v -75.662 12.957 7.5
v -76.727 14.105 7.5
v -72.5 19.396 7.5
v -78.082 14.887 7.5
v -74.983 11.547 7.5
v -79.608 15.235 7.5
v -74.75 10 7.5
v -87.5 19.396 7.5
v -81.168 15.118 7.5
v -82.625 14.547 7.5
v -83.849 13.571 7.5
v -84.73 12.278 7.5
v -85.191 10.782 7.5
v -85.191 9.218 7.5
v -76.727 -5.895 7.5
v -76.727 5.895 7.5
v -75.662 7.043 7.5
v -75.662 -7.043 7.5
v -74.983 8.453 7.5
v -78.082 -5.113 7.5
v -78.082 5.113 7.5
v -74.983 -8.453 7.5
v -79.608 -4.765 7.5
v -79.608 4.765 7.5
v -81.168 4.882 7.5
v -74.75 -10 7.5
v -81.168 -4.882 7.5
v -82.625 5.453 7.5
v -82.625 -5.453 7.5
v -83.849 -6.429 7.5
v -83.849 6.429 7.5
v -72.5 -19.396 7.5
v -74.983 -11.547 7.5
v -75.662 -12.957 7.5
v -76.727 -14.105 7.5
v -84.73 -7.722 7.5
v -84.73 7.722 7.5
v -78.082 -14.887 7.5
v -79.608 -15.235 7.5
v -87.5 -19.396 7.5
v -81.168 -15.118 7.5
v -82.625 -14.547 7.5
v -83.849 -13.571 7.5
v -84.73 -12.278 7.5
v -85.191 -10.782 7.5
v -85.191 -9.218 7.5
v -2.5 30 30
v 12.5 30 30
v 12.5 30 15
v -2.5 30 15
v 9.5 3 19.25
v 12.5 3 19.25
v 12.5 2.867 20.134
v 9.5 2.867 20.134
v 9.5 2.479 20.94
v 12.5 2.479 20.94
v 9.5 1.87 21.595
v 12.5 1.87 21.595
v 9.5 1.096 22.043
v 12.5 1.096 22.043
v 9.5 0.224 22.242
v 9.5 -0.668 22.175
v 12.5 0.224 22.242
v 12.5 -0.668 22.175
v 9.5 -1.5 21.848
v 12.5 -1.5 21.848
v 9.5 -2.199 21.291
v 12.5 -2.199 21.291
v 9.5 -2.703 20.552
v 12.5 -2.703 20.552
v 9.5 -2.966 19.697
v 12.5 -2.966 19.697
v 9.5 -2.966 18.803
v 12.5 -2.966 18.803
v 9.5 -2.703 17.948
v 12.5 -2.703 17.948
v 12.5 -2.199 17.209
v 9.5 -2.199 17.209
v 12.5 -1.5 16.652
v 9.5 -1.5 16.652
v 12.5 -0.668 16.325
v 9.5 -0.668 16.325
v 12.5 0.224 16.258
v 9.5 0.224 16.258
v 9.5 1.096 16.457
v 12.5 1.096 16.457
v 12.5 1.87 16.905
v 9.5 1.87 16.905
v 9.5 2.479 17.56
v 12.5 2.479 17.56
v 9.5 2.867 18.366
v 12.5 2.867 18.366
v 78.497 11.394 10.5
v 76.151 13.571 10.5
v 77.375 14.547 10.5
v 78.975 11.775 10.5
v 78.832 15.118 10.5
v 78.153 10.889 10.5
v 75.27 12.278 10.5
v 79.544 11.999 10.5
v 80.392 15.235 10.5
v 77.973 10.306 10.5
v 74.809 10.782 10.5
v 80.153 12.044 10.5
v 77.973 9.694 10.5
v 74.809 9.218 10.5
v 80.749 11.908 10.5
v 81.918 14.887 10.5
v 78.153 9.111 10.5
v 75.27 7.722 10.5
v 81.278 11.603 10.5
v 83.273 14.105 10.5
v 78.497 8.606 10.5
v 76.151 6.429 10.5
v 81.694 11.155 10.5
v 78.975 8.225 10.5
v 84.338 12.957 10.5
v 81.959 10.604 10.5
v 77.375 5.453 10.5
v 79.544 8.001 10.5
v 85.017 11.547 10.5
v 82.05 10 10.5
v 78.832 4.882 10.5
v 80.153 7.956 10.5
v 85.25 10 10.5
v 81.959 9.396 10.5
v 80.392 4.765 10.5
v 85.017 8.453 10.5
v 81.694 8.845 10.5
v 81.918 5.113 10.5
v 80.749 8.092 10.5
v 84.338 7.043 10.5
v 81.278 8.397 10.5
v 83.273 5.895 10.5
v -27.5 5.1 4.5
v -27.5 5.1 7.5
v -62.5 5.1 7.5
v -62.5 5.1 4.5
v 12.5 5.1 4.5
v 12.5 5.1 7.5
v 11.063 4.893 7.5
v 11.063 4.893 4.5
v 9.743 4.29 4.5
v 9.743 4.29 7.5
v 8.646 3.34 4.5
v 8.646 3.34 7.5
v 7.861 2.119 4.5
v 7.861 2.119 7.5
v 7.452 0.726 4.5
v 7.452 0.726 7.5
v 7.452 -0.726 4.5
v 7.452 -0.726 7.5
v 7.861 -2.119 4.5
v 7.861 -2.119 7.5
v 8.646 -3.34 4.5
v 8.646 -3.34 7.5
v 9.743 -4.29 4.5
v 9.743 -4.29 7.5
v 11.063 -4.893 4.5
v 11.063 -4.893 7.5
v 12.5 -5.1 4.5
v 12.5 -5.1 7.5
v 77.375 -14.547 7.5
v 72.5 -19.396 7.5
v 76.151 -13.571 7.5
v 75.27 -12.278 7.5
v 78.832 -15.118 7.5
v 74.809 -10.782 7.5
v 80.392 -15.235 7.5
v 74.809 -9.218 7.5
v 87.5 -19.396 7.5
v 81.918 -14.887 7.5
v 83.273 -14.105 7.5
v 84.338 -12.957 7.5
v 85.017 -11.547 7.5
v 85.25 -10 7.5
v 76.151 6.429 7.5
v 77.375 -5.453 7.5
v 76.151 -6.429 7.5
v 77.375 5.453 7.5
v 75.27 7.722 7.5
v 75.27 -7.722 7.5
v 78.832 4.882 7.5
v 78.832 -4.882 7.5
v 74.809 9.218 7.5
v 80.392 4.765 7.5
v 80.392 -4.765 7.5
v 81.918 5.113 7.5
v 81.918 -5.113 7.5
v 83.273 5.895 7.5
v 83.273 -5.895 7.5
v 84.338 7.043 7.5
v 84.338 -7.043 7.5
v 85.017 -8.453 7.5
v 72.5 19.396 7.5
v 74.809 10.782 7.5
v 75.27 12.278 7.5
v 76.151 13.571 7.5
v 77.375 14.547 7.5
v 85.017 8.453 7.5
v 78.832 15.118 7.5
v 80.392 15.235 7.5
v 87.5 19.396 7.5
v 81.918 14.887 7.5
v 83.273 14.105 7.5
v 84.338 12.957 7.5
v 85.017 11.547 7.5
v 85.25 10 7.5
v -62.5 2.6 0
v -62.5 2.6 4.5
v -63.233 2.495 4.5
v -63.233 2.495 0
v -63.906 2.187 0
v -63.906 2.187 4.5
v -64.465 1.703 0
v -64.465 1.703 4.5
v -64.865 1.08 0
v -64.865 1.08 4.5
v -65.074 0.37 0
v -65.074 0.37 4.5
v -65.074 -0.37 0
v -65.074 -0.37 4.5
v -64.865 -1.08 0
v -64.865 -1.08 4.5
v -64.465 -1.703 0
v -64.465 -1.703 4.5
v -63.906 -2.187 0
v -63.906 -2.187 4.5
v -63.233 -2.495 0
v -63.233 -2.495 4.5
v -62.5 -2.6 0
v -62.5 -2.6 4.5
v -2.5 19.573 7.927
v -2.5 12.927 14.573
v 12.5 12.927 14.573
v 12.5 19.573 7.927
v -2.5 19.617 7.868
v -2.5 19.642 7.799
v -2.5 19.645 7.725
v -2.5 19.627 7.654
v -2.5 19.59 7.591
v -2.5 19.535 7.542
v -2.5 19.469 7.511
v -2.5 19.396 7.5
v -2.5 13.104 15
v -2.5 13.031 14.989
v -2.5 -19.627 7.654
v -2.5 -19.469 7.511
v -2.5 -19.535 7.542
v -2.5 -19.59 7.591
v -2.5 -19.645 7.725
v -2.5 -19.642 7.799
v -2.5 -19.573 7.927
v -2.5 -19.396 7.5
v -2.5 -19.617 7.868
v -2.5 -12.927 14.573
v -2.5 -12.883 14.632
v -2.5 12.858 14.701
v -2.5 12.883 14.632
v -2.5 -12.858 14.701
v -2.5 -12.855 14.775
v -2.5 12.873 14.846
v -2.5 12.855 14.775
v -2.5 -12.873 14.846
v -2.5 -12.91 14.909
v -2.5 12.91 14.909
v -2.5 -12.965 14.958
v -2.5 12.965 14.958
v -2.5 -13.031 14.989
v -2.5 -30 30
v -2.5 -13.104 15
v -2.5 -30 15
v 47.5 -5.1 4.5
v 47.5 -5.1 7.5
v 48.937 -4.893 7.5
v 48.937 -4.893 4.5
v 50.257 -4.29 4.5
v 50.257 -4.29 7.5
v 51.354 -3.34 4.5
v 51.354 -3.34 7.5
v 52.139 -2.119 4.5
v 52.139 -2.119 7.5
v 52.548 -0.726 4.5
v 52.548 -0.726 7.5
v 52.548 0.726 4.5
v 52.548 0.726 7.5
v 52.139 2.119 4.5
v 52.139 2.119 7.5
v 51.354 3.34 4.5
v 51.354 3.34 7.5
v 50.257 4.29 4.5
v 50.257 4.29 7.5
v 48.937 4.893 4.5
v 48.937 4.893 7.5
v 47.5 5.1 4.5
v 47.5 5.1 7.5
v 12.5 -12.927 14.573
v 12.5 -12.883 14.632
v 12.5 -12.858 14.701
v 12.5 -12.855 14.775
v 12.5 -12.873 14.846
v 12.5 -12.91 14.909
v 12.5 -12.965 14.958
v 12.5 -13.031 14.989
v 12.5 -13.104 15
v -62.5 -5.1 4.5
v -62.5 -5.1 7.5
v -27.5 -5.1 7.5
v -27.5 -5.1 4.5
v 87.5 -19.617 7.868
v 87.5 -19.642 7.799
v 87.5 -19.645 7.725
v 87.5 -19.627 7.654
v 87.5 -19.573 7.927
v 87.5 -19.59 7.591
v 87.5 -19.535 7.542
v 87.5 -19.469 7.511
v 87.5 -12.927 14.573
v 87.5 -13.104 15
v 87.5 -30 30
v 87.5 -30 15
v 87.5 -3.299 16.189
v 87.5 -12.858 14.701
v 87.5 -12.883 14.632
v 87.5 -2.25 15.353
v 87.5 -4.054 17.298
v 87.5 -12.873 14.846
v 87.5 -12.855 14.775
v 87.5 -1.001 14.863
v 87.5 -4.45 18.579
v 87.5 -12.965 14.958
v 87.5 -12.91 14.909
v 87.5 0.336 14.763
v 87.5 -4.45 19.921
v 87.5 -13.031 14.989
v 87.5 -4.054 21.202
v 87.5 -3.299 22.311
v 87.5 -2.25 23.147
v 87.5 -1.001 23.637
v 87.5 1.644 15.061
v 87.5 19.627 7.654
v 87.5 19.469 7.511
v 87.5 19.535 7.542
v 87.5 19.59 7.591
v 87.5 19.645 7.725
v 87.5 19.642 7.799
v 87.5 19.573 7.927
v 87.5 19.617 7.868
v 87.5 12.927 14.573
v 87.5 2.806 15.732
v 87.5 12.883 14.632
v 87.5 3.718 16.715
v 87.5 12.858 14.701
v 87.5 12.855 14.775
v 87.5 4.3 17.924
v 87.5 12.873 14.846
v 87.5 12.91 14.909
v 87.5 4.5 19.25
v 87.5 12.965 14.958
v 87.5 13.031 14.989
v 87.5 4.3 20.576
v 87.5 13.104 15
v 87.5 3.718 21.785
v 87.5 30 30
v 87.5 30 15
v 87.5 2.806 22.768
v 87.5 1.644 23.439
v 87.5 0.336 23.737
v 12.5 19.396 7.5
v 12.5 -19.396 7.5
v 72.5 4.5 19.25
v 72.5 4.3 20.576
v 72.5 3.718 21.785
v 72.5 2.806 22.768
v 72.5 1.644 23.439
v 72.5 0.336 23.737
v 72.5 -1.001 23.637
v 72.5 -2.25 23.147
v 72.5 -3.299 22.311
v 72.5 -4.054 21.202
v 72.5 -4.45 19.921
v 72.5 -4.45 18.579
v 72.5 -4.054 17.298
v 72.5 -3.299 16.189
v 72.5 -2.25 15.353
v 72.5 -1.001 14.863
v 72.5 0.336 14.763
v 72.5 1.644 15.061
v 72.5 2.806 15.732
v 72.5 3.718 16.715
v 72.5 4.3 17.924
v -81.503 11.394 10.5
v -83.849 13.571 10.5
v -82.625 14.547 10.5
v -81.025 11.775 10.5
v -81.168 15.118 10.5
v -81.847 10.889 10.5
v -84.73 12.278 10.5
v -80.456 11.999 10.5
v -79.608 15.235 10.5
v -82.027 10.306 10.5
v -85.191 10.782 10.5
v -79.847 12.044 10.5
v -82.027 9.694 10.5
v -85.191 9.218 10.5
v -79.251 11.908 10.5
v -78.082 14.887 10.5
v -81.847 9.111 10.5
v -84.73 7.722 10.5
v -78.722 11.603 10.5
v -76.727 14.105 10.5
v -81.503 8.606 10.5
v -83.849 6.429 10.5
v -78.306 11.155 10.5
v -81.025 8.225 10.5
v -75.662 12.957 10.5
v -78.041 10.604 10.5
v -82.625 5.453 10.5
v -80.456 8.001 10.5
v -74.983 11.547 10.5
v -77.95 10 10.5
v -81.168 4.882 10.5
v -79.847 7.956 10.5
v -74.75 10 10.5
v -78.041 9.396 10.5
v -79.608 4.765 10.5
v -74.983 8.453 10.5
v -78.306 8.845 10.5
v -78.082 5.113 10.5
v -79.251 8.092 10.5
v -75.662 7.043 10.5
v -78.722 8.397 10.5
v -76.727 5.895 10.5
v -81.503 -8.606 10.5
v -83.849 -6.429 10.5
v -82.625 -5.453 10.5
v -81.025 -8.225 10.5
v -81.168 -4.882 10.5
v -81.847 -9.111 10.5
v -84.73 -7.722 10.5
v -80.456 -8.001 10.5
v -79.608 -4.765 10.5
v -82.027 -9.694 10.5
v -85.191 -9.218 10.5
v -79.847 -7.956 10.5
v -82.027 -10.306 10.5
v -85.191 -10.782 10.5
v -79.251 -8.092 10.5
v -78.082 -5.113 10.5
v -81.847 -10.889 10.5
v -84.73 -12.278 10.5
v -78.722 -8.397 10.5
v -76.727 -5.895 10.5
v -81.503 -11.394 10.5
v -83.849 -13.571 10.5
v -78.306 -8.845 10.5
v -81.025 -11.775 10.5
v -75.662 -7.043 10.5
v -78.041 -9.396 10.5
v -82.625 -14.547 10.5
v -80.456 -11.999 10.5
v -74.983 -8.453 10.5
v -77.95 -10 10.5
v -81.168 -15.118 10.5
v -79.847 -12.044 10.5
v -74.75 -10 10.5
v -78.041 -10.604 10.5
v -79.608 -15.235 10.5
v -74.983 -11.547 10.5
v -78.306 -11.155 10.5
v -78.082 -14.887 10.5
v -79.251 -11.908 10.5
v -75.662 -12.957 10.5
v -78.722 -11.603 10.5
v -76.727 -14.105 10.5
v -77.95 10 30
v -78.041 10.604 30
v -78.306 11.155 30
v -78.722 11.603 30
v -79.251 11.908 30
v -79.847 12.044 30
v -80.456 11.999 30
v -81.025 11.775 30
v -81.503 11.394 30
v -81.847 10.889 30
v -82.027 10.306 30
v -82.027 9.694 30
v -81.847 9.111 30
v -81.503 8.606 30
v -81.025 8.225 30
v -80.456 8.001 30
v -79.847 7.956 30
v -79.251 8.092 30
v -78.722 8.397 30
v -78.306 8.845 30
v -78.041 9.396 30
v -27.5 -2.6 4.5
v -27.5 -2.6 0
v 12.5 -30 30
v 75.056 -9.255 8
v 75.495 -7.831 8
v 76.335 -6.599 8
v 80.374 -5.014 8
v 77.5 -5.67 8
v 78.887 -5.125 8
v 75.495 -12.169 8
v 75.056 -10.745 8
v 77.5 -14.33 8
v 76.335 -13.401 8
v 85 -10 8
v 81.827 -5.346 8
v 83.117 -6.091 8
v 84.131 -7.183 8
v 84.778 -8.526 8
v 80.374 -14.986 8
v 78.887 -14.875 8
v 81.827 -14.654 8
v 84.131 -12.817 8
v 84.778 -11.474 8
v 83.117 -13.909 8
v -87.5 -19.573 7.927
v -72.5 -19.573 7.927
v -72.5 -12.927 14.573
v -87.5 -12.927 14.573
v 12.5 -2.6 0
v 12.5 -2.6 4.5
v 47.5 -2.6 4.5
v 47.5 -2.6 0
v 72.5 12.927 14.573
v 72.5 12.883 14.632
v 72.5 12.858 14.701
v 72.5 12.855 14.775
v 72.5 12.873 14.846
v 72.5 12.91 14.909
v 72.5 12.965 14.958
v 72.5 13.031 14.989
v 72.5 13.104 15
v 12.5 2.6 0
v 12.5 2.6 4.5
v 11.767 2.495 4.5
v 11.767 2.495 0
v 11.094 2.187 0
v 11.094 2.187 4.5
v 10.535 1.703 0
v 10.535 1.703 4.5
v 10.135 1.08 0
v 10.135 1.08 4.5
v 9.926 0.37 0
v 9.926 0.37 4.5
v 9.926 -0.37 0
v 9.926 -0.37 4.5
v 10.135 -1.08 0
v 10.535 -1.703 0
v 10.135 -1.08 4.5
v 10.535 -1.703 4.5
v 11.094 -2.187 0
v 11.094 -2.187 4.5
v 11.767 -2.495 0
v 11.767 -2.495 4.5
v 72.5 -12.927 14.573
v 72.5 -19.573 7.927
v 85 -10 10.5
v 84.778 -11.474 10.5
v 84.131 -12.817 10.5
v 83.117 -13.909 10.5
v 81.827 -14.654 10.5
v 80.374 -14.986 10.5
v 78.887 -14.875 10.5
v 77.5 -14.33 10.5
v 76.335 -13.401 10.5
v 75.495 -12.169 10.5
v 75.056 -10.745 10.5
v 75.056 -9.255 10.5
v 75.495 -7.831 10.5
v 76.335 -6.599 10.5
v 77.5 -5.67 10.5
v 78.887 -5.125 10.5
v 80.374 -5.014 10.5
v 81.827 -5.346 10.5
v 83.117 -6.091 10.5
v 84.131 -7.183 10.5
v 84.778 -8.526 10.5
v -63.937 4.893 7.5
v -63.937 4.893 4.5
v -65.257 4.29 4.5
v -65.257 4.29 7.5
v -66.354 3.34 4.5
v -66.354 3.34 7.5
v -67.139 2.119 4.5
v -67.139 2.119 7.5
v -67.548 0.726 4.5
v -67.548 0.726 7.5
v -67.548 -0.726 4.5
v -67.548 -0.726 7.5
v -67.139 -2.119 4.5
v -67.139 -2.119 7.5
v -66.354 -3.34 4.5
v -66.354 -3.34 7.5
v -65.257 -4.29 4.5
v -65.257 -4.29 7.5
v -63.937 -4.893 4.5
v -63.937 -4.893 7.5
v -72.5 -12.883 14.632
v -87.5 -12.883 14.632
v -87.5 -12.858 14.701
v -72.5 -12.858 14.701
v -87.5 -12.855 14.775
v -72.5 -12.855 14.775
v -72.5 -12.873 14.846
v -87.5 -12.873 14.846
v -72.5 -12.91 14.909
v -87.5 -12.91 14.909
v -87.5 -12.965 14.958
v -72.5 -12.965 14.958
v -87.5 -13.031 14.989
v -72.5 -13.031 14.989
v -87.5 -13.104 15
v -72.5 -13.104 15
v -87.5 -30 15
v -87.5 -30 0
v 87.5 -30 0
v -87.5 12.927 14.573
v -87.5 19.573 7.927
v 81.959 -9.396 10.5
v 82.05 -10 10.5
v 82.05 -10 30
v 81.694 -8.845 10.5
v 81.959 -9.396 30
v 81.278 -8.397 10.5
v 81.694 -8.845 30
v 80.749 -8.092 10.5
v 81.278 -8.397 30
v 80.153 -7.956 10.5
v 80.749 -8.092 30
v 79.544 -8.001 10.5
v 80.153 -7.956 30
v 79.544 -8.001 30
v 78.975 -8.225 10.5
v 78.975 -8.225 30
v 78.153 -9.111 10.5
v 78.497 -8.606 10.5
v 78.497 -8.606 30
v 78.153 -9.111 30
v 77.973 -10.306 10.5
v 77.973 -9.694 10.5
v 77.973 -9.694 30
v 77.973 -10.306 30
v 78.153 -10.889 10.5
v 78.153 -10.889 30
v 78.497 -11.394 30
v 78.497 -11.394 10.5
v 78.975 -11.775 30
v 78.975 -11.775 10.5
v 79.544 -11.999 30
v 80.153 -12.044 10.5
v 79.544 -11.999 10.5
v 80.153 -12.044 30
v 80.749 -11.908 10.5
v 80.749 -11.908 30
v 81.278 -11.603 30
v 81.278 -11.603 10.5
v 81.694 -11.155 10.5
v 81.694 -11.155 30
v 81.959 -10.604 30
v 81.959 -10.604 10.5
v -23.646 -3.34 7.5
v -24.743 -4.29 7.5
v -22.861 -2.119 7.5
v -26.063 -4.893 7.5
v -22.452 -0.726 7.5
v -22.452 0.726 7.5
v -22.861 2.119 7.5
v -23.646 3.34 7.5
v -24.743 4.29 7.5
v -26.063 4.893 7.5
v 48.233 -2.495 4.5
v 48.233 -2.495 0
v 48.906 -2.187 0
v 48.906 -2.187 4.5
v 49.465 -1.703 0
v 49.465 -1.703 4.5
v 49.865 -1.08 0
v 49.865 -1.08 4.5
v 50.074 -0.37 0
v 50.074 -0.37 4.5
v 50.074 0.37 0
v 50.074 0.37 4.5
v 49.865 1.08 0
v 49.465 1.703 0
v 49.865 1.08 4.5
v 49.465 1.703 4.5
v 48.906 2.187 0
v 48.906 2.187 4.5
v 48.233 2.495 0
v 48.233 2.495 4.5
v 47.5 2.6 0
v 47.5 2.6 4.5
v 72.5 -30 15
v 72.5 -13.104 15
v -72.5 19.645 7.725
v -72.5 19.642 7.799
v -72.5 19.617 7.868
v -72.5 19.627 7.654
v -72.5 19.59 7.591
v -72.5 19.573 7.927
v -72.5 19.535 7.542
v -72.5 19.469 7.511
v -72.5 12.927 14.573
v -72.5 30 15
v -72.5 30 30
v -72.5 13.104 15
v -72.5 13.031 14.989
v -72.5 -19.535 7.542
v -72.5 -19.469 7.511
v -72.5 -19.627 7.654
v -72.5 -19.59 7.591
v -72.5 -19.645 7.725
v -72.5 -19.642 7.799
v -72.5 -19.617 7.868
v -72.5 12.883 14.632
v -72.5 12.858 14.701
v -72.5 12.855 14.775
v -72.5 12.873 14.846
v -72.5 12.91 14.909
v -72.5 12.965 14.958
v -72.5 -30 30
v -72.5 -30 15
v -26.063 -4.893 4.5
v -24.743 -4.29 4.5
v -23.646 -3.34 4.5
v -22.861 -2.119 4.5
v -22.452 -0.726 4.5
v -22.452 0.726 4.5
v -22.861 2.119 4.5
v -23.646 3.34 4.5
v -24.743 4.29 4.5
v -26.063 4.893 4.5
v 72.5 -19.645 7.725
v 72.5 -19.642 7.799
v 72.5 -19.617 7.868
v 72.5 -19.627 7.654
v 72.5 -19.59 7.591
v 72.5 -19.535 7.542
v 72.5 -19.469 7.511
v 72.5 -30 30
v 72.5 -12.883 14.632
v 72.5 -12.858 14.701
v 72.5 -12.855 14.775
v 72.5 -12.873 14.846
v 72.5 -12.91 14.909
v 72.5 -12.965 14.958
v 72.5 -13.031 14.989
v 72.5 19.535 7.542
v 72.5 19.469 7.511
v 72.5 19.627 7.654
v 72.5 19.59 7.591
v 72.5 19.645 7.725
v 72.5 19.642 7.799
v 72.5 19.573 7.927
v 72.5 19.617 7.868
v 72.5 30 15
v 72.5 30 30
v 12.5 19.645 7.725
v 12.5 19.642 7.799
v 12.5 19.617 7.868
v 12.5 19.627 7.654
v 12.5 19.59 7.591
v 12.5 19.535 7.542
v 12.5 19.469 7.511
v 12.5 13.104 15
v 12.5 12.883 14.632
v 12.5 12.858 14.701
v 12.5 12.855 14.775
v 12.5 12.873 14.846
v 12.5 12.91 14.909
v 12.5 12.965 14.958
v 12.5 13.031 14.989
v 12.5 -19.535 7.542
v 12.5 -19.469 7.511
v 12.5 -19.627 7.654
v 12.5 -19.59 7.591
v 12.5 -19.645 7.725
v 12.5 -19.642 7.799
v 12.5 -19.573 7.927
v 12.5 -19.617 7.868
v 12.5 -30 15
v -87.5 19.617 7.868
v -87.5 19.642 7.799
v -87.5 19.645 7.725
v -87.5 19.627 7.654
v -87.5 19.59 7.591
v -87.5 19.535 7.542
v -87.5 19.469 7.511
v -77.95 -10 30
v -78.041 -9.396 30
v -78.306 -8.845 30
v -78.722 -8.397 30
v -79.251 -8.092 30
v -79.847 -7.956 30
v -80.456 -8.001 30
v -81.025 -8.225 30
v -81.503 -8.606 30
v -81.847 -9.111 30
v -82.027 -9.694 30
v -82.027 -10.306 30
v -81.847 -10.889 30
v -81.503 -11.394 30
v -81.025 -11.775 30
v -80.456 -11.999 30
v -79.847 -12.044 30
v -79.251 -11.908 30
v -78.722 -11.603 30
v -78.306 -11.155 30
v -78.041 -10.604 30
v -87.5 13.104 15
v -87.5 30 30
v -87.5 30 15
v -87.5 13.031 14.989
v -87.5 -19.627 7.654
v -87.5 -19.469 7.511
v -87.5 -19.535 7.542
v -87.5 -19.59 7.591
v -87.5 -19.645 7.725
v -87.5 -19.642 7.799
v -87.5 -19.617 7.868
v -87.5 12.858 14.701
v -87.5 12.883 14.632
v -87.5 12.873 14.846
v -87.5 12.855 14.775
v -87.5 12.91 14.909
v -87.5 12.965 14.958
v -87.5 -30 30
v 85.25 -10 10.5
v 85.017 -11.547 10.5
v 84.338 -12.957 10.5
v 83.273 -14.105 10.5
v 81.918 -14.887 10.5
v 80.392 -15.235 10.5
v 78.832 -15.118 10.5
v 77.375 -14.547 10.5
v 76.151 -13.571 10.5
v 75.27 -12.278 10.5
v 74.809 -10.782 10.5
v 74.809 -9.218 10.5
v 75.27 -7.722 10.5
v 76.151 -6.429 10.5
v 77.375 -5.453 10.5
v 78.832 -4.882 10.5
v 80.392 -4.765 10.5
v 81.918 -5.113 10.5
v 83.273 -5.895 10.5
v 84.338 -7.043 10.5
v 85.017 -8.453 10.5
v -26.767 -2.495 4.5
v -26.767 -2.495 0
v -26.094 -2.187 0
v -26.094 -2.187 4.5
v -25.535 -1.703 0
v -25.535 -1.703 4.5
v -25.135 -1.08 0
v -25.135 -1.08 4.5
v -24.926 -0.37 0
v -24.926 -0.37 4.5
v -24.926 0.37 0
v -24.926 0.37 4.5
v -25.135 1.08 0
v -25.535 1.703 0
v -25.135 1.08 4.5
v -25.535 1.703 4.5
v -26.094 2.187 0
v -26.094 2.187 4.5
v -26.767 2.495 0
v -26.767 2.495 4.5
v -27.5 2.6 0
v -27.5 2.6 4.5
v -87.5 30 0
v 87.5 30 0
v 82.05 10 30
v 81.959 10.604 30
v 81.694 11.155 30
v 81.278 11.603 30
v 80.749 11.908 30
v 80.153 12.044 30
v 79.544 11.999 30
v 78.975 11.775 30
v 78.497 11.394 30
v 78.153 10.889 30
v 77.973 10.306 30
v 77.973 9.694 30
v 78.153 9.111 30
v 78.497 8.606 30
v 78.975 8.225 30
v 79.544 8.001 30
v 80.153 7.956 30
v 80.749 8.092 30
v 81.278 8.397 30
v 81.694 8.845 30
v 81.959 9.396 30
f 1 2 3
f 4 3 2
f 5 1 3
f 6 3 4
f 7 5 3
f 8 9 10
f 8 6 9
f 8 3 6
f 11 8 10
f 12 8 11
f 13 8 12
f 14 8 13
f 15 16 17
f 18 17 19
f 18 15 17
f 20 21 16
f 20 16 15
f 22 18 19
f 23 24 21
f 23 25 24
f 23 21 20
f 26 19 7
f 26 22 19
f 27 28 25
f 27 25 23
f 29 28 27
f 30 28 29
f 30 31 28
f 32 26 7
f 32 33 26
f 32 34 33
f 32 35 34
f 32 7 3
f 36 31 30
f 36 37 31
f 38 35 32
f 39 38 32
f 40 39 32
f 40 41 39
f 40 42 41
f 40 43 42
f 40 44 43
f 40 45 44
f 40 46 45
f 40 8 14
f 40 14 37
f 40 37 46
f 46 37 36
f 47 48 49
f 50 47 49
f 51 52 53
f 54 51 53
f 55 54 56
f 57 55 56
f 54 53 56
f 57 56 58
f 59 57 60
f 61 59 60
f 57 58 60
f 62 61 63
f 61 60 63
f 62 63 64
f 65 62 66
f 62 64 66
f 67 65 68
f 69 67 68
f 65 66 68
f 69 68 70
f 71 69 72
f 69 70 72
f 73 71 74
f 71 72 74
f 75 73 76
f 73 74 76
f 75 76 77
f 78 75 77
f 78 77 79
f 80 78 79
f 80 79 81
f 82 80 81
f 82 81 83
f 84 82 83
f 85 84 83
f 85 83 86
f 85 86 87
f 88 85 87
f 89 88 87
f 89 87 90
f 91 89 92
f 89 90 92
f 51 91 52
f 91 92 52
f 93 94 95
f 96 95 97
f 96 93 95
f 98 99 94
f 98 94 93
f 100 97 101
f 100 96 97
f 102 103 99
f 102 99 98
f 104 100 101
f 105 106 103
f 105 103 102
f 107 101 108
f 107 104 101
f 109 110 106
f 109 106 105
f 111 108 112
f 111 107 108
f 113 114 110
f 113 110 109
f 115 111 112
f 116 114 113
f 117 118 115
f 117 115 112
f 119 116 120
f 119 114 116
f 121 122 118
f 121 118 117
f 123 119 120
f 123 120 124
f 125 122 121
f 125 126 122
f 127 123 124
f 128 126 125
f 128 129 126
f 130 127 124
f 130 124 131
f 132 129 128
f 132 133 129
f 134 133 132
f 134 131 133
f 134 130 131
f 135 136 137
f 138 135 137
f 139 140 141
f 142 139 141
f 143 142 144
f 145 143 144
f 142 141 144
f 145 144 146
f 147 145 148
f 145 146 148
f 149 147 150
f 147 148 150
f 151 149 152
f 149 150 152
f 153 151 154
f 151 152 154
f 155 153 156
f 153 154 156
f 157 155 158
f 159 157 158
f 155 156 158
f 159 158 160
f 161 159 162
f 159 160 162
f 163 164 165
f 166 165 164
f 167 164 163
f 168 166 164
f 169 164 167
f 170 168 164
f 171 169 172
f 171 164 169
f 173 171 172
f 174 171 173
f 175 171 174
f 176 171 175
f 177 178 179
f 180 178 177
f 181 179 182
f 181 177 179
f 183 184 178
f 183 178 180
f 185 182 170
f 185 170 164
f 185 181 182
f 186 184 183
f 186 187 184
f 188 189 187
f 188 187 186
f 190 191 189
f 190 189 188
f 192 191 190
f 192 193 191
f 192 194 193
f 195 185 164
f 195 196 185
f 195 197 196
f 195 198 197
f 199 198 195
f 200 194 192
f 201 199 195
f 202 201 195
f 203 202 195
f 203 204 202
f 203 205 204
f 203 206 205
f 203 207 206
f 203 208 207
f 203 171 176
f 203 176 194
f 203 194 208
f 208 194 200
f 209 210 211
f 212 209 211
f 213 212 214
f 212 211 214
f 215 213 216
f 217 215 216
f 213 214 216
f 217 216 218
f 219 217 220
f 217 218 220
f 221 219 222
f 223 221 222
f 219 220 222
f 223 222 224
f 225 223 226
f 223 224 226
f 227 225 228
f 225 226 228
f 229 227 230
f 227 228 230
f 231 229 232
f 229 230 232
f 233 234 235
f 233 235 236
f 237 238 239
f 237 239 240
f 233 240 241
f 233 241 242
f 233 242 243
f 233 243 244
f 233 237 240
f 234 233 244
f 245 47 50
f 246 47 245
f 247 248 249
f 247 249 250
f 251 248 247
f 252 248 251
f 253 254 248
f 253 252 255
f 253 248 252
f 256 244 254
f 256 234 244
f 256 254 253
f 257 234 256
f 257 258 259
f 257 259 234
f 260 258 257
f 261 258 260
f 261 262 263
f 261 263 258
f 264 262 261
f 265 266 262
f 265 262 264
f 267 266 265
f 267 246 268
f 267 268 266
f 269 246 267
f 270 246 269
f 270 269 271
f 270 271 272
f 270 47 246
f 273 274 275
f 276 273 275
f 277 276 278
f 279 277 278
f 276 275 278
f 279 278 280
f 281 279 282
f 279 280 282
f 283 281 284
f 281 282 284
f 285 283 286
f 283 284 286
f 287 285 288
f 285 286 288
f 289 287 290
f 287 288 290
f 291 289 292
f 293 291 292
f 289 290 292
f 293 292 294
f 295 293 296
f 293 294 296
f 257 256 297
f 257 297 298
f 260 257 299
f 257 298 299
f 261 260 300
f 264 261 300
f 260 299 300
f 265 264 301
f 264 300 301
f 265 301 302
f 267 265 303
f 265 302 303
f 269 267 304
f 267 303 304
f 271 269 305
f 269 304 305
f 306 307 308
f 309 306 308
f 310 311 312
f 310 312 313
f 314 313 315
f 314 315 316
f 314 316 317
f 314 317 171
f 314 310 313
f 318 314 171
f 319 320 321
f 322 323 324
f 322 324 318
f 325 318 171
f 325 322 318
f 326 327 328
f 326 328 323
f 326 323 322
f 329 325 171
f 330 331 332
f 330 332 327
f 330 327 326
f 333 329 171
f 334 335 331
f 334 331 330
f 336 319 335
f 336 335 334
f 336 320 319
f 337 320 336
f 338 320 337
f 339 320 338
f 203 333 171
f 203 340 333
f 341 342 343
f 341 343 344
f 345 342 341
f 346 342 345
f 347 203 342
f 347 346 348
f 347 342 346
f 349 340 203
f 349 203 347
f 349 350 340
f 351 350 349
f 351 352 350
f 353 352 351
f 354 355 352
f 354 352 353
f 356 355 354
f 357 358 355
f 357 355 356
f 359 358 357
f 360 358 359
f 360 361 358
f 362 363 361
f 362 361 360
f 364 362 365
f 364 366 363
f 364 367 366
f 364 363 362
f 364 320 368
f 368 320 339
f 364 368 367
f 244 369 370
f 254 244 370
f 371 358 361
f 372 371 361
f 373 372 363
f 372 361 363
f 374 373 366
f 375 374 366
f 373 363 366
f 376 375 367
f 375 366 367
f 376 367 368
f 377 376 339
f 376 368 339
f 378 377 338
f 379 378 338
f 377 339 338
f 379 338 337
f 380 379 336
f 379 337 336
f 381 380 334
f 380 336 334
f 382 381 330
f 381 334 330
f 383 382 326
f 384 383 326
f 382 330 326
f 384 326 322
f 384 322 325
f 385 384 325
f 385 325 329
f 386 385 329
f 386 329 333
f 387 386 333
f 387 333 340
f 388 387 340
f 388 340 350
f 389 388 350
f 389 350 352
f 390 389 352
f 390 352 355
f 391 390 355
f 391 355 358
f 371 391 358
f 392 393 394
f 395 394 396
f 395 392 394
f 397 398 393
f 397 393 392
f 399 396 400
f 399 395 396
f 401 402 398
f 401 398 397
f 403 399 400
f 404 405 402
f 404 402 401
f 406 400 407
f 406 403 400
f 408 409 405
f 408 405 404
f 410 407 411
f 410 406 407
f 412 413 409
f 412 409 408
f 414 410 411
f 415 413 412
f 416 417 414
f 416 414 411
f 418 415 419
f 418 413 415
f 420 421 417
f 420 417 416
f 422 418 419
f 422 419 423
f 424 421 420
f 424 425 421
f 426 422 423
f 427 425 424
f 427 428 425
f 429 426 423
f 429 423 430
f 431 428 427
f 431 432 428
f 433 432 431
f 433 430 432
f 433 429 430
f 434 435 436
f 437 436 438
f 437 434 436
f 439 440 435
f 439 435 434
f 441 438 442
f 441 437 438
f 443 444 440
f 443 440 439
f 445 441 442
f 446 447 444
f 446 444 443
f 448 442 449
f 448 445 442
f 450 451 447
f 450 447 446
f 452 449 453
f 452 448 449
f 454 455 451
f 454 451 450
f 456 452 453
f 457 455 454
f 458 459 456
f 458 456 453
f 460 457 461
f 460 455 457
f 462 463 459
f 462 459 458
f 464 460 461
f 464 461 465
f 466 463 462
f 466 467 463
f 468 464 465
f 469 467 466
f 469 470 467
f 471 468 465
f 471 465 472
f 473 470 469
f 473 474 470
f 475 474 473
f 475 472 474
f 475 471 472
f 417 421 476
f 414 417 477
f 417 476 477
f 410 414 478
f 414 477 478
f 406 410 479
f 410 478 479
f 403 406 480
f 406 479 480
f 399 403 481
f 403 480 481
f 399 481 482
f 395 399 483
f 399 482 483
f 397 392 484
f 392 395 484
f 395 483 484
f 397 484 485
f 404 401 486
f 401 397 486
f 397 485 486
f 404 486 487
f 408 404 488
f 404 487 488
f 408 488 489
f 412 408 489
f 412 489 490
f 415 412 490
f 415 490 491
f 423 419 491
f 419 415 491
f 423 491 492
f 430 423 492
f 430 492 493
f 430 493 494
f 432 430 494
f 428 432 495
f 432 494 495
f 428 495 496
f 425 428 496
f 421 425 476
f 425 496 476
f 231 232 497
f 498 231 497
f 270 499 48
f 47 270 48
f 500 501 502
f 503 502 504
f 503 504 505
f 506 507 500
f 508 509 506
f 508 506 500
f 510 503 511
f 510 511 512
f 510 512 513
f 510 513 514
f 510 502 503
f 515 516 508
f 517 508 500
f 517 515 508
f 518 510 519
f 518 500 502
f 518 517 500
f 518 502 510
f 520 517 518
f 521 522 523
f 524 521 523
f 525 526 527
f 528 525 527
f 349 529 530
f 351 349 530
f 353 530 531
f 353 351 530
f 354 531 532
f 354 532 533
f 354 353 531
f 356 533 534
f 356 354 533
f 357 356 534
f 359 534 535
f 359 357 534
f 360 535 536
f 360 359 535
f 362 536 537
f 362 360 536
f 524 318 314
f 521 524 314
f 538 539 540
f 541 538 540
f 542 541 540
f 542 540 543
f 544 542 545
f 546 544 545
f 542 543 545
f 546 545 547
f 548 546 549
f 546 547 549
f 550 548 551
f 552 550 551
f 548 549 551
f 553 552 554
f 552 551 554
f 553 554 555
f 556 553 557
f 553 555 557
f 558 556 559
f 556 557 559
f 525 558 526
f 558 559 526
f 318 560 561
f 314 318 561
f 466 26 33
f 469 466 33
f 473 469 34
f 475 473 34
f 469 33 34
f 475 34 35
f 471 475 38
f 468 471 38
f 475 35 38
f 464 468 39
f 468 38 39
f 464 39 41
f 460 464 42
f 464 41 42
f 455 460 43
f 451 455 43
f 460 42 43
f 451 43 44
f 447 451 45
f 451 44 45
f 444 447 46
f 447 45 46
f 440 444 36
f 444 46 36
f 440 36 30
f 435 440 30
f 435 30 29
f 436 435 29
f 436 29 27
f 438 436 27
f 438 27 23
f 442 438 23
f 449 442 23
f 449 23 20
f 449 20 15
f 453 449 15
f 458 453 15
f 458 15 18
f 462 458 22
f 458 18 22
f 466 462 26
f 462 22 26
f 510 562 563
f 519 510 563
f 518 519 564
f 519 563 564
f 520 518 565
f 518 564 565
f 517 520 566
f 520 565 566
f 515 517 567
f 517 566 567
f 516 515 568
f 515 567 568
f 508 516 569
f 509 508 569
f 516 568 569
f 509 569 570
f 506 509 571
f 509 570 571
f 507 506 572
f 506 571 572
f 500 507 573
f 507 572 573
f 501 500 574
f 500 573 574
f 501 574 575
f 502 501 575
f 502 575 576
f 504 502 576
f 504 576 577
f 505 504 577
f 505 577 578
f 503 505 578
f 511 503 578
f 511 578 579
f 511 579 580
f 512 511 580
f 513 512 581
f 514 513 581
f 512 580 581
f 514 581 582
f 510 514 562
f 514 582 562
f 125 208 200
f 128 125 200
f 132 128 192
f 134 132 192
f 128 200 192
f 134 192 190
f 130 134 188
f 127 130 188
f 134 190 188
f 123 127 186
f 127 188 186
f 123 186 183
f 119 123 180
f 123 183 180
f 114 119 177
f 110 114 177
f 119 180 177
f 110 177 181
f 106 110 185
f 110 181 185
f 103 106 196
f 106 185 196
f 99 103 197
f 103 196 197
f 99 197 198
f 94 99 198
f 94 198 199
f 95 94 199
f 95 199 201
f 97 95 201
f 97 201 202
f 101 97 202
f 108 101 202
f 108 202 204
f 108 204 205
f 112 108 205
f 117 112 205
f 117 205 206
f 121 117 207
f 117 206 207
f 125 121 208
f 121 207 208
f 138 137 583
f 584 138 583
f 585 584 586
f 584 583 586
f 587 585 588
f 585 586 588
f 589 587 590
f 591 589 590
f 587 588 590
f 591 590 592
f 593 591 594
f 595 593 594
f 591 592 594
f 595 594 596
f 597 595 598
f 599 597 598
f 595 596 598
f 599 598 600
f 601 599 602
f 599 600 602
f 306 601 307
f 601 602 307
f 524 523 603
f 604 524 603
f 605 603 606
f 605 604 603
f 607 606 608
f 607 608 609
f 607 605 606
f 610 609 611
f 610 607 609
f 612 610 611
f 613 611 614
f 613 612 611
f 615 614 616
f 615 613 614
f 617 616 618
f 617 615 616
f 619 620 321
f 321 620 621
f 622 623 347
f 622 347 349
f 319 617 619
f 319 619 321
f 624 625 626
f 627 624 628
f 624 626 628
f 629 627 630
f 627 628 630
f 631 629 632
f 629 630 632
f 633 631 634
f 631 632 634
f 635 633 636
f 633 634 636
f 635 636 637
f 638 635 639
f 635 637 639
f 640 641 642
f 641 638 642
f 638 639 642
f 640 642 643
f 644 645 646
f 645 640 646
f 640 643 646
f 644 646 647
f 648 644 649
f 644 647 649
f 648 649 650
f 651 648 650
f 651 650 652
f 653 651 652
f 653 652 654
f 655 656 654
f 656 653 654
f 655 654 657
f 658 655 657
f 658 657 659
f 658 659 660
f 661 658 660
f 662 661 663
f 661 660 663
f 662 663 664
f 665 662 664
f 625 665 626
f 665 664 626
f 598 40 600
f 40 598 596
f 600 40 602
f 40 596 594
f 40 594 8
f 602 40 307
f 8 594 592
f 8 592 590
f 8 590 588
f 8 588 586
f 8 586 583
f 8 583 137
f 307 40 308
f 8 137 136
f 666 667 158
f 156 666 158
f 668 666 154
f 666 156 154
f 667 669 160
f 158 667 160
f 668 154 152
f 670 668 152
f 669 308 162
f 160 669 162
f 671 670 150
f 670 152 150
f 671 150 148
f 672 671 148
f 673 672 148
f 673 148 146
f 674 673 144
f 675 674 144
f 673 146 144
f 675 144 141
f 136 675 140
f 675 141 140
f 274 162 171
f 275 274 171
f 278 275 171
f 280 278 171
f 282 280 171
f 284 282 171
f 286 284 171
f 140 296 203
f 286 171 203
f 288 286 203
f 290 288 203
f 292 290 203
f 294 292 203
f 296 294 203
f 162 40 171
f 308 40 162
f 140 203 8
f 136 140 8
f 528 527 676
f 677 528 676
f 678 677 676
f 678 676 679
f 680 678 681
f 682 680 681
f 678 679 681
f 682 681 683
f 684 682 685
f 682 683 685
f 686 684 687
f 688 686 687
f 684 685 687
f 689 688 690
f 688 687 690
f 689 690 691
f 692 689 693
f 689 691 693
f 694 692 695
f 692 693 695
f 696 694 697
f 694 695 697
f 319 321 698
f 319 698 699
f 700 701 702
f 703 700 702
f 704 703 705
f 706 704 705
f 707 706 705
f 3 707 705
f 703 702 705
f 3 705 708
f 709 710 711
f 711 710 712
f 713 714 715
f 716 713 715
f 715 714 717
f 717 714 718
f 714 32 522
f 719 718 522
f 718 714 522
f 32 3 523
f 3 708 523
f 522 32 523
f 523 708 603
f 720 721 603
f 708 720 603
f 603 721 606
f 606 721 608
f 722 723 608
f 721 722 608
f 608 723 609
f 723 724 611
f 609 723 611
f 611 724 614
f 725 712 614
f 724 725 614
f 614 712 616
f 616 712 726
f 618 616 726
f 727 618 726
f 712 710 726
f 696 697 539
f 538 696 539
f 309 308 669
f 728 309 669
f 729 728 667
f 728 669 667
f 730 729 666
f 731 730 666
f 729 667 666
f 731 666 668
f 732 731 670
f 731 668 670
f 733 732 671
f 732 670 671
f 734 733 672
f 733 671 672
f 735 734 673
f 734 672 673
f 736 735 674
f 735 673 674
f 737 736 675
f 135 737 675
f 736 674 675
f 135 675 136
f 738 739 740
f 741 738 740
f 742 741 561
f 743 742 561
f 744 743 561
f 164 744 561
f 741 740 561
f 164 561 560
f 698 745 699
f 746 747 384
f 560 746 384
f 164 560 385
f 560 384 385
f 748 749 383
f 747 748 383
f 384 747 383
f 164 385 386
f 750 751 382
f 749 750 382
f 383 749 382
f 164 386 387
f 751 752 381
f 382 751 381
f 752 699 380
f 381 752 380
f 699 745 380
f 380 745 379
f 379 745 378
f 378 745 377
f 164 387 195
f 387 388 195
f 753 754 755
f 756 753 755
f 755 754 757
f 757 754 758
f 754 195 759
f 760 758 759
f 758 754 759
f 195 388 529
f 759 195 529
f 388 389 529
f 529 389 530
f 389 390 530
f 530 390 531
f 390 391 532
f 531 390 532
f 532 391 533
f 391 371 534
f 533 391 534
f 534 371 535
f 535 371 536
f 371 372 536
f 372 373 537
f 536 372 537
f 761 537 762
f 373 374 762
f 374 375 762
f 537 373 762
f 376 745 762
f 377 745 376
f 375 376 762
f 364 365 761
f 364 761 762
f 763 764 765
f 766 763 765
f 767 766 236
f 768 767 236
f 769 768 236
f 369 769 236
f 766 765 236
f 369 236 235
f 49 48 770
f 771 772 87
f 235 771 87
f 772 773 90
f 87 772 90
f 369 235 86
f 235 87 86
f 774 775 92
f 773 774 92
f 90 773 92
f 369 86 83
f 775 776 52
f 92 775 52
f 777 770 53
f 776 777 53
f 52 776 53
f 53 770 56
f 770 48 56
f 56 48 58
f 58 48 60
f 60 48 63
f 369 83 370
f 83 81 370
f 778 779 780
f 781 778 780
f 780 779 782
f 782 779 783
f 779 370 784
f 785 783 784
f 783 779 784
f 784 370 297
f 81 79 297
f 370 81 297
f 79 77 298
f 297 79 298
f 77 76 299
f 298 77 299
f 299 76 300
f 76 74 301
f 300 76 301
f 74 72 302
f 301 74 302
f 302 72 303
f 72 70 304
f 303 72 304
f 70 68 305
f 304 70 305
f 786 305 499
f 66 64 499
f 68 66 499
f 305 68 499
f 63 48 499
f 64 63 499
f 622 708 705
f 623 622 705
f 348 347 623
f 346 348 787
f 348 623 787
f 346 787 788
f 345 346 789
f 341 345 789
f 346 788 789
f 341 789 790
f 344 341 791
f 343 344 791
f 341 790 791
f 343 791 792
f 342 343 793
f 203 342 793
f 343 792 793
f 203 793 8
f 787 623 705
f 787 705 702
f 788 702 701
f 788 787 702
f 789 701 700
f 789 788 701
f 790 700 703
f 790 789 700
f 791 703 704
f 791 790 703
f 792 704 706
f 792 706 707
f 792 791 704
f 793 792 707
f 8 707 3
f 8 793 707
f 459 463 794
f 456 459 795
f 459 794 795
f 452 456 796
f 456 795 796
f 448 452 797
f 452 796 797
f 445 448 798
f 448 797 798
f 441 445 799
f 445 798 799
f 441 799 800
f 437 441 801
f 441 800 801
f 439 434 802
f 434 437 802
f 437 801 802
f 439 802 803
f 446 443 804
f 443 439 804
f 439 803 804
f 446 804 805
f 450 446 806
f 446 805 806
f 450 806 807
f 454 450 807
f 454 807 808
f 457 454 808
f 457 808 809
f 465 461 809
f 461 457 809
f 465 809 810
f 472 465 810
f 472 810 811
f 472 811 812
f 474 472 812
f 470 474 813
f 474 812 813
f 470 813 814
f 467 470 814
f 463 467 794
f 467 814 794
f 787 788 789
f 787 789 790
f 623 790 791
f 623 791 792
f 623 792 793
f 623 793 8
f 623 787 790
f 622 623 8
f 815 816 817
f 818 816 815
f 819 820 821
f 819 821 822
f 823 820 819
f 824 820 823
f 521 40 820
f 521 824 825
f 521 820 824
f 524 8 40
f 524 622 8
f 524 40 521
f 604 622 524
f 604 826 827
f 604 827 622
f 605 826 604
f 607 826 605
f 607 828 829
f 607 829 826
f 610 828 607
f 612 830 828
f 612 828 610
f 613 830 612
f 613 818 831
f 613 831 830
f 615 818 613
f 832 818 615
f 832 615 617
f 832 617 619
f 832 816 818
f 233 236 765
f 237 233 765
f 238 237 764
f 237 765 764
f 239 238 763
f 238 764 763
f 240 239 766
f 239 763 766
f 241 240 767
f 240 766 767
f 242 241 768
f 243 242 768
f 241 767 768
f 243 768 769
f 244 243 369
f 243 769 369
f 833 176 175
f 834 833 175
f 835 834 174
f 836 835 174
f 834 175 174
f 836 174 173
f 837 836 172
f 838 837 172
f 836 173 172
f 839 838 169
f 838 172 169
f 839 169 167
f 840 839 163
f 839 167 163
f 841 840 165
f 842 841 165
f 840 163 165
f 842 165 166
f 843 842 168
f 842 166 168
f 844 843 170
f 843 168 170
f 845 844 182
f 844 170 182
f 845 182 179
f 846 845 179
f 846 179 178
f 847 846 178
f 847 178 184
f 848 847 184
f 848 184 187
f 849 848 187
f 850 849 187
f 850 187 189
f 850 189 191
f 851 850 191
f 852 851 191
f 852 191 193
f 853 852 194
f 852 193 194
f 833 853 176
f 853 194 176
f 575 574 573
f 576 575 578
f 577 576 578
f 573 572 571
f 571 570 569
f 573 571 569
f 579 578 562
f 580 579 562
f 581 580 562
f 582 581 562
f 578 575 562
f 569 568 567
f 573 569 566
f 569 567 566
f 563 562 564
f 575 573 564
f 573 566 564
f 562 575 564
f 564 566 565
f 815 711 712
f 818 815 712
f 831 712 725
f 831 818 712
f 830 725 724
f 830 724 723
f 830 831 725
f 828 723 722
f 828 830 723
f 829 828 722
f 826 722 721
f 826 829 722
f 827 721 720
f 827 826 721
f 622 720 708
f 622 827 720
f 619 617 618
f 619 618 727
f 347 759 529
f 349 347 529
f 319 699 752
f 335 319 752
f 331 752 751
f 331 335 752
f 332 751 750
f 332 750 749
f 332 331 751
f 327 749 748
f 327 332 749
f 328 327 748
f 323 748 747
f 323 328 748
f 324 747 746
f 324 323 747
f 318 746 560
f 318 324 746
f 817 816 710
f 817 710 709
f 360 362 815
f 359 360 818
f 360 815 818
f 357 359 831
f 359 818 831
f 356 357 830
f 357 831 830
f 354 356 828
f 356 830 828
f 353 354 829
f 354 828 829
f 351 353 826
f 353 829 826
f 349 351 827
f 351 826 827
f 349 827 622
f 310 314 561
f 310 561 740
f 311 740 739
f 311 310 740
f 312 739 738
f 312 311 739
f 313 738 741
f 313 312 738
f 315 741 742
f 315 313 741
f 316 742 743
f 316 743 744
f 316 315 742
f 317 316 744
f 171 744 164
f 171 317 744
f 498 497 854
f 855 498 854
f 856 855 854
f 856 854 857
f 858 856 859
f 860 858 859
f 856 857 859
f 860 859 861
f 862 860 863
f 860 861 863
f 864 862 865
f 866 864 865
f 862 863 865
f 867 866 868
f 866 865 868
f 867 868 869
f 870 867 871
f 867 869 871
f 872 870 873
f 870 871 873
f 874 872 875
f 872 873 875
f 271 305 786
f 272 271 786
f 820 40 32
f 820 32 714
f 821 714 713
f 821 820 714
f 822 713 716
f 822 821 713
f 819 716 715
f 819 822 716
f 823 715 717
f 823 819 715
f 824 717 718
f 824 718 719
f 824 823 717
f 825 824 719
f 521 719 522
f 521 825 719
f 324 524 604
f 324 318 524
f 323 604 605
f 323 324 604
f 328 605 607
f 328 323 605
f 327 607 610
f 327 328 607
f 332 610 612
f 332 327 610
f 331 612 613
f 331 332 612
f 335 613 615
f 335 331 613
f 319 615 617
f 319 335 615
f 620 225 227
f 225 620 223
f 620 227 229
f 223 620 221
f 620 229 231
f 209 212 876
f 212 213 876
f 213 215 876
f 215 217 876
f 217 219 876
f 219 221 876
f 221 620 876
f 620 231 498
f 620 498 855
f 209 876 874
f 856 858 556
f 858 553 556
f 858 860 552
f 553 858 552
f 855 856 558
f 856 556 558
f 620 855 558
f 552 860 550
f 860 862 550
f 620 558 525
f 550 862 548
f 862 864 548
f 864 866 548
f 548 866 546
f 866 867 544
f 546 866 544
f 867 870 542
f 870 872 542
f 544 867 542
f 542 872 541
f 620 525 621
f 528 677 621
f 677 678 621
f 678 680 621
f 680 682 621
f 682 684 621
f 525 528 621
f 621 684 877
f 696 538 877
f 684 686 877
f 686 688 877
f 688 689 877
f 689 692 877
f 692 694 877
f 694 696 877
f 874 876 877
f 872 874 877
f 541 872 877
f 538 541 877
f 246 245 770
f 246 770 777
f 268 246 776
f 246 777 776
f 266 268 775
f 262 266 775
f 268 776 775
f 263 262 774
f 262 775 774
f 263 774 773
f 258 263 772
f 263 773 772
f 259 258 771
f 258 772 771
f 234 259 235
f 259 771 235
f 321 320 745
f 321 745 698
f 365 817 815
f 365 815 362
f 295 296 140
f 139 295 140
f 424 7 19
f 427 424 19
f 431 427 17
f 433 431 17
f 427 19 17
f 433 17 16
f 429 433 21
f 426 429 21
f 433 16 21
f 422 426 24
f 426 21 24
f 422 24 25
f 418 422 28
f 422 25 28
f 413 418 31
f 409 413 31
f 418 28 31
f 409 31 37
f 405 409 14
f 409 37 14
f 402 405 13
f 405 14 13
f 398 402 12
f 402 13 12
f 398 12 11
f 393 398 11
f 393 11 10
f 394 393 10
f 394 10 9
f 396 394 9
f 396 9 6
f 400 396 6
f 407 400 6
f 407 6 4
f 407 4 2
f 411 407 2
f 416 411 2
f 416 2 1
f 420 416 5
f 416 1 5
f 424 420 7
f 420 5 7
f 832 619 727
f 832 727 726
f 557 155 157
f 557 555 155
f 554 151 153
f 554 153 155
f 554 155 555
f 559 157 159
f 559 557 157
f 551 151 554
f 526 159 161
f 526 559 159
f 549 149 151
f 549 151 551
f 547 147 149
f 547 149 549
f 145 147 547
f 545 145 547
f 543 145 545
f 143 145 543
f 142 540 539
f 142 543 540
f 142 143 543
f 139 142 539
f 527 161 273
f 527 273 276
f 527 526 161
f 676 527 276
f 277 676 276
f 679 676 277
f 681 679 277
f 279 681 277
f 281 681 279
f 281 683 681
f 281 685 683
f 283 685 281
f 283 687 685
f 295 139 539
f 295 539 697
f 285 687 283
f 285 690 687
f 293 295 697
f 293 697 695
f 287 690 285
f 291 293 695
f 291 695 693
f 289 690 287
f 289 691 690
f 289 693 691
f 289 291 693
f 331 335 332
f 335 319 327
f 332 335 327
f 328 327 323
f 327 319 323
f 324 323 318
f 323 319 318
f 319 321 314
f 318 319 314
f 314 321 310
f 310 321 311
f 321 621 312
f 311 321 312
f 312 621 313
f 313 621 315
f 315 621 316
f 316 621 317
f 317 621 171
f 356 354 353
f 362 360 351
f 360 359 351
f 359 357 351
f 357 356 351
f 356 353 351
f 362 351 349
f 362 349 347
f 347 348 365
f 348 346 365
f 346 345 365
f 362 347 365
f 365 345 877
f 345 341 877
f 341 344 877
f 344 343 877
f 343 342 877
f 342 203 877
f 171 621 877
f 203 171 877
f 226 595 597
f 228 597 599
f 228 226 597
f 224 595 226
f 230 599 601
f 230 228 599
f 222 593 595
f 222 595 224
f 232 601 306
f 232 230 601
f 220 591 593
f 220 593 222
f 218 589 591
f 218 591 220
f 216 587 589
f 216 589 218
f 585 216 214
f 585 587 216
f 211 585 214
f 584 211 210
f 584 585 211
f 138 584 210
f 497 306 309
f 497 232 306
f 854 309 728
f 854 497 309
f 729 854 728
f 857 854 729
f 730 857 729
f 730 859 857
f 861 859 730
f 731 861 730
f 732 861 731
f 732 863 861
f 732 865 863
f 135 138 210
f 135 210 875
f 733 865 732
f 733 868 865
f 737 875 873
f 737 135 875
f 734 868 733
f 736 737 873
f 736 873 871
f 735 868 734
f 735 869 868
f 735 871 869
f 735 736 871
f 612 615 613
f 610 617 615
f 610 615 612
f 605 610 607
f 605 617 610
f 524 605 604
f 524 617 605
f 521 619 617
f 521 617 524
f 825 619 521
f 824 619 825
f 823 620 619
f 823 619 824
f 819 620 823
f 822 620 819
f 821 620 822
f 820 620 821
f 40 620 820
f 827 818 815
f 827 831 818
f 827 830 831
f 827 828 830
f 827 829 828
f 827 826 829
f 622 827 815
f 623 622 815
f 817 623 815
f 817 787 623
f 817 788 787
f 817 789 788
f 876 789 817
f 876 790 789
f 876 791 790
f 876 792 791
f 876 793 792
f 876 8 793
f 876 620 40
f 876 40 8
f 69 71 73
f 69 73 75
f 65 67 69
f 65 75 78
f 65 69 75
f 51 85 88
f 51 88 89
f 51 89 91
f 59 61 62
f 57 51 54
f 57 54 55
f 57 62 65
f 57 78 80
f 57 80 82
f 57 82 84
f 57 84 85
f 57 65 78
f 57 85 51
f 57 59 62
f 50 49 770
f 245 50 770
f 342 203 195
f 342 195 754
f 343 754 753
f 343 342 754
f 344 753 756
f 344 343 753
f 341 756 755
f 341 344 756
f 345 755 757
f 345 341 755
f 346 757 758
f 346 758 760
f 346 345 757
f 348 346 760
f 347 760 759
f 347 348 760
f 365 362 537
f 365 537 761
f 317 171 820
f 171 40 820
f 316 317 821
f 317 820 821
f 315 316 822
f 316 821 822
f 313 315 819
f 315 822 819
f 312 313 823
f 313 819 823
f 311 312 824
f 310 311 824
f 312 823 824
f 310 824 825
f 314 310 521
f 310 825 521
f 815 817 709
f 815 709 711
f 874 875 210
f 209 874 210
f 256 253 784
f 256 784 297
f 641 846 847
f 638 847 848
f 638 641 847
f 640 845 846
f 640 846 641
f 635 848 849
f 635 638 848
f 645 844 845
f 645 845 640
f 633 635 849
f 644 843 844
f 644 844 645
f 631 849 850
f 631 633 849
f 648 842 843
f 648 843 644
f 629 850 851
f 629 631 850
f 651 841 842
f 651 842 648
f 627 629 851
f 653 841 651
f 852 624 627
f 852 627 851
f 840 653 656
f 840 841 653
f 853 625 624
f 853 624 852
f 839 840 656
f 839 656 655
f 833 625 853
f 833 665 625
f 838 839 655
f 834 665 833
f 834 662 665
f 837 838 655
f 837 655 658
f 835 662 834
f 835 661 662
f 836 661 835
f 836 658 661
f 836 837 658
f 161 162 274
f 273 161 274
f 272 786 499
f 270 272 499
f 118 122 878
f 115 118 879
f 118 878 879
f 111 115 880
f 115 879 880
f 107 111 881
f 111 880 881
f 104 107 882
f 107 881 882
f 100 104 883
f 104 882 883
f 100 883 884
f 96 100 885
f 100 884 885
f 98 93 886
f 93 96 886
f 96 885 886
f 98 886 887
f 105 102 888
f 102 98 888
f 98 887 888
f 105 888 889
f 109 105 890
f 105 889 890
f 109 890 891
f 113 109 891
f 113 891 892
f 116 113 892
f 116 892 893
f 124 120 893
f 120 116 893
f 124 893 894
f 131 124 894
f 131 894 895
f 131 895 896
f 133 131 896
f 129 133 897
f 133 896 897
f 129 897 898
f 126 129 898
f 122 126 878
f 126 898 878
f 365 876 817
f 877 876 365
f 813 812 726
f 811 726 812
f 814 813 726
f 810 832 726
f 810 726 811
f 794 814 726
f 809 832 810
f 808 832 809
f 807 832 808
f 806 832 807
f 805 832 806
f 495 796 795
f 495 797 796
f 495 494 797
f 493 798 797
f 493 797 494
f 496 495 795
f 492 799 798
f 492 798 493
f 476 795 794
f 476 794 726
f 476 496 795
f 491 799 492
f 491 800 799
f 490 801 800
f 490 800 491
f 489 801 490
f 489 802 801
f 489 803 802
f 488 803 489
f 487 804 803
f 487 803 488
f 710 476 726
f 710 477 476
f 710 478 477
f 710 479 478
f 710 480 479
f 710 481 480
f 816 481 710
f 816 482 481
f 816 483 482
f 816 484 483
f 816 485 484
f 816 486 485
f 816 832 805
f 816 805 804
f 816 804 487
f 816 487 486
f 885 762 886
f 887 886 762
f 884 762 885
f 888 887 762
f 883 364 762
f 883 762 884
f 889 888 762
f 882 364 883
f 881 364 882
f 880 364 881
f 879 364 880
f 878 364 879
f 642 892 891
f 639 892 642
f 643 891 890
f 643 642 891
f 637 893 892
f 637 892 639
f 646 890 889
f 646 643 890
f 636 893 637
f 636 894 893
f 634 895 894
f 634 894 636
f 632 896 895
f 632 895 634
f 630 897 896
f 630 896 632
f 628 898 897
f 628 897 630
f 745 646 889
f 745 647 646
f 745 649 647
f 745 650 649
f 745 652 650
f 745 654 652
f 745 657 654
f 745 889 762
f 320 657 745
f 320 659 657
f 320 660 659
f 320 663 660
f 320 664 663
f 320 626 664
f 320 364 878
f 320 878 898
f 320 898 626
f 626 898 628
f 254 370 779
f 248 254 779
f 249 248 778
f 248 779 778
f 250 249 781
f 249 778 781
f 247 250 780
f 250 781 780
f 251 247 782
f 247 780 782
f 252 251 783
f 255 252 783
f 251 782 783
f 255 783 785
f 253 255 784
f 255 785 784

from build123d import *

# Parameters (mm, degrees)
F0_W      = 175
F0_H      = 60
F1_DEPTH  = 15
F3_DEPTH  = 175.001
F4_R      = 0.25
F6_DEPTH  = 15
F7_R      = 4.5
F8_DEPTH  = 175.001
F10_DEPTH = 15
F13_DEPTH = 15
F14_R     = 3
F15_DEPTH = 3
F16_R     = 2.05
F17_DEPTH = 22.5
F18_R     = 2.05
F19_DEPTH = 22.5
F20_R     = 5.25
F20_R_2   = 2.05
F21_DEPTH = 3
F22_R     = 5.25
F22_R_2   = 2.05
F23_DEPTH = 3
F24_R     = 5
F24_R_2   = 2.05
F25_DEPTH = 2.5
F27_DEPTH = 25
F29_DEPTH = 3


with BuildPart() as f1:
    # F0 (on Top) → F1 (new body)
    with BuildSketch(Plane.XY):
        Rectangle(F0_W, F0_H)
    extrude(amount=F1_DEPTH)

    # F2 (on face) → F3 (cut, through all)
    with BuildSketch(Plane.YZ.offset(87.5)):
        Polygon((-12.5, 15), (-20, 7.5), (20, 7.5), (12.5, 15), align=None)
        Polygon((-8.8884221898, 18.6115778102), (-12.5, 15), (12.5, 15), (9.7629078865, 17.7370921135), align=None)
    extrude(amount=-F3_DEPTH, mode=Mode.SUBTRACT)

    # F4
    f4_edges = [f1.edges().sort_by_distance(p)[0] for p in [
        (0, -20, 7.5),
        (0, 20, 7.5),
        (0, 12.5, 15),
        (0, -12.5, 15),
    ]]
    fillet(f4_edges, radius=F4_R)

    # F26 (on face) → F27 (cut)
    with BuildSketch(Plane.XY.offset(7.5)):
        with BuildLine():
            ThreePointArc((-27.5, -2.6), (-24.9, 0), (-27.5, 2.6))
            Line((-27.5, 2.6), (-62.5, 2.6))
            ThreePointArc((-62.5, 2.6), (-65.1, 0), (-62.5, -2.6))
            Line((-62.5, -2.6), (-27.5, -2.6))
        make_face()
        with BuildLine():
            ThreePointArc((12.5, 2.6), (9.9, 0), (12.5, -2.6))
            Line((12.5, -2.6), (47.5, -2.6))
            ThreePointArc((47.5, -2.6), (50.1, 0), (47.5, 2.6))
            Line((47.5, 2.6), (12.5, 2.6))
        make_face()
    extrude(amount=-F27_DEPTH, mode=Mode.SUBTRACT)

    # F28 (on face) → F29 (cut)
    with BuildSketch(Plane.XY.offset(7.5)):
        with BuildLine():
            ThreePointArc((12.5, 5.1), (7.4, 0), (12.5, -5.1))
            Line((12.5, -5.1), (47.5, -5.1))
            ThreePointArc((47.5, -5.1), (52.6, 0), (47.5, 5.1))
            Line((47.5, 5.1), (12.5, 5.1))
        make_face()
        with BuildLine():
            ThreePointArc((-27.5, -5.1), (-22.4, 0), (-27.5, 5.1))
            Line((-27.5, 5.1), (-62.5, 5.1))
            ThreePointArc((-62.5, 5.1), (-67.6, 0), (-62.5, -5.1))
            Line((-62.5, -5.1), (-27.5, -5.1))
        make_face()
    extrude(amount=-F29_DEPTH, mode=Mode.SUBTRACT)


with BuildPart() as f6:
    # F5 (on face) → F6 (new body)
    with BuildSketch(Plane.YZ.offset(87.5)):
        with BuildLine():
            Line((13.1035533906, 15), (30, 15))
            Line((30, 15), (30, 30))
            Line((30, 30), (-30, 30))
            Line((-30, 30), (-30, 15))
            Line((-30, 15), (-13.1035533906, 15))
            ThreePointArc((-13.1035533906, 15), (-12.8725835075, 14.8456708581), (-12.9267766953, 14.5732233047))
            Line((-12.9267766953, 14.5732233047), (-19.5732233047, 7.9267766953))
            ThreePointArc((-19.5732233047, 7.9267766953), (-19.6274164925, 7.6543291419), (-19.3964466094, 7.5))
            Line((-19.3964466094, 7.5), (19.3964466094, 7.5))
            ThreePointArc((19.3964466094, 7.5), (19.6274164925, 7.6543291419), (19.5732233047, 7.9267766953))
            Line((19.5732233047, 7.9267766953), (12.9267766953, 14.5732233047))
            ThreePointArc((12.9267766953, 14.5732233047), (12.8725835075, 14.8456708581), (13.1035533906, 15))
        make_face()
    extrude(amount=-F6_DEPTH)

    # F7 (on face) → F8 (cut, through all)
    with BuildSketch(Plane.YZ.offset(87.5)):
        with Locations((0, 19.25)):
            Circle(F7_R)
    extrude(amount=-F8_DEPTH, mode=Mode.SUBTRACT)

    # F16 (on face) → F17 (cut, through all)
    with BuildSketch(Plane.XY.offset(30)):
        with Locations((80, 10)):
            Circle(F16_R)
        with Locations((80, -10)):
            Circle(F16_R)
    extrude(amount=-F17_DEPTH, mode=Mode.SUBTRACT)

    # F22 (on face) → F23 (cut)
    with BuildSketch(Plane(origin=(0, 0, 7.5), x_dir=(1, 0, 0), z_dir=(0, 0, -1))):
        with Locations((80, 10.0000000002)):
            Circle(F22_R)
        with Locations((80, 10)):
            Circle(F22_R_2, mode=Mode.SUBTRACT)
        with Locations((80, -9.9999999998)):
            Circle(F22_R)
        with Locations((80, -10)):
            Circle(F22_R_2, mode=Mode.SUBTRACT)
    extrude(amount=-F23_DEPTH, mode=Mode.SUBTRACT)


with BuildPart() as f10:
    # F9 (on face) → F10 (new body)
    with BuildSketch(Plane(origin=(-87.5, 0, 0), x_dir=(0, -1, 0), z_dir=(-1, 0, 0))):
        with BuildLine():
            Line((-12.9267766953, 14.5732233047), (-19.5732233047, 7.9267766953))
            ThreePointArc((-19.5732233047, 7.9267766953), (-19.6274164925, 7.6543291419), (-19.3964466094, 7.5))
            Line((-19.3964466094, 7.5), (19.3964466094, 7.5))
            ThreePointArc((19.3964466094, 7.5), (19.6274164925, 7.6543291419), (19.5732233047, 7.9267766953))
            Line((19.5732233047, 7.9267766953), (12.9267766953, 14.5732233047))
            ThreePointArc((12.9267766953, 14.5732233047), (12.8725835075, 14.8456708581), (13.1035533906, 15))
            Line((13.1035533906, 15), (30, 15))
            Line((30, 15), (30, 30))
            Line((30, 30), (-30, 30))
            Line((-30, 30), (-30, 15))
            Line((-30, 15), (-13.1035533906, 15))
            ThreePointArc((-13.1035533906, 15), (-12.8725835075, 14.8456708581), (-12.9267766953, 14.5732233047))
        make_face()
    extrude(amount=-F10_DEPTH)

    # F18 (on face) → F19 (cut, through all)
    with BuildSketch(Plane.XY.offset(30)):
        with Locations((-80, 10)):
            Circle(F18_R)
        with Locations((-80, -10)):
            Circle(F18_R)
    extrude(amount=-F19_DEPTH, mode=Mode.SUBTRACT)

    # F20 (on face) → F21 (cut)
    with BuildSketch(Plane(origin=(0, 0, 7.5), x_dir=(1, 0, 0), z_dir=(0, 0, -1))):
        with Locations((-80, 10.0000000002)):
            Circle(F20_R)
        with Locations((-80, 10)):
            Circle(F20_R_2, mode=Mode.SUBTRACT)
        with Locations((-80, -9.9999999998)):
            Circle(F20_R)
        with Locations((-80, -10)):
            Circle(F20_R_2, mode=Mode.SUBTRACT)
    extrude(amount=-F21_DEPTH, mode=Mode.SUBTRACT)


with BuildPart() as f13:
    # F12 (on offset) → F13 (new body)
    with BuildSketch(Plane(origin=(12.5, 0, 0), x_dir=(0, -1, 0), z_dir=(-1, 0, 0))):
        with BuildLine():
            Line((-12.9267766953, 14.5732233047), (-19.5732233047, 7.9267766953))
            ThreePointArc((-19.5732233047, 7.9267766953), (-19.6274164925, 7.6543291419), (-19.3964466094, 7.5))
            Line((-19.3964466094, 7.5), (19.3964466094, 7.5))
            ThreePointArc((19.3964466094, 7.5), (19.6274164925, 7.6543291419), (19.5732233047, 7.9267766953))
            Line((19.5732233047, 7.9267766953), (12.9267766953, 14.5732233047))
            ThreePointArc((12.9267766953, 14.5732233047), (12.8725835075, 14.8456708581), (13.1035533906, 15))
            Line((13.1035533906, 15), (30, 15))
            Line((30, 15), (30, 30))
            Line((30, 30), (-30, 30))
            Line((-30, 30), (-30, 15))
            Line((-30, 15), (-13.1035533906, 15))
            ThreePointArc((-13.1035533906, 15), (-12.8725835075, 14.8456708581), (-12.9267766953, 14.5732233047))
        make_face()
    extrude(amount=F13_DEPTH)

    # F14 (on face) → F15 (cut)
    with BuildSketch(Plane.YZ.offset(12.5)):
        with Locations((0, 19.25)):
            Circle(F14_R)
    extrude(amount=-F15_DEPTH, mode=Mode.SUBTRACT)


with BuildPart() as f25:
    # F24 (on face) → F25 (new body)
    with BuildSketch(Plane(origin=(0, 0, 10.5), x_dir=(1, 0, 0), z_dir=(0, 0, -1))):
        with Locations((80, 10.0000000002)):
            Circle(F24_R)
        with Locations((80, 10)):
            Circle(F24_R_2, mode=Mode.SUBTRACT)
        with Locations((80, 10)):
            Circle(F24_R_2)
    extrude(amount=F25_DEPTH)


solid = Compound([f1.part, f6.part, f10.part, f13.part, f25.part])
